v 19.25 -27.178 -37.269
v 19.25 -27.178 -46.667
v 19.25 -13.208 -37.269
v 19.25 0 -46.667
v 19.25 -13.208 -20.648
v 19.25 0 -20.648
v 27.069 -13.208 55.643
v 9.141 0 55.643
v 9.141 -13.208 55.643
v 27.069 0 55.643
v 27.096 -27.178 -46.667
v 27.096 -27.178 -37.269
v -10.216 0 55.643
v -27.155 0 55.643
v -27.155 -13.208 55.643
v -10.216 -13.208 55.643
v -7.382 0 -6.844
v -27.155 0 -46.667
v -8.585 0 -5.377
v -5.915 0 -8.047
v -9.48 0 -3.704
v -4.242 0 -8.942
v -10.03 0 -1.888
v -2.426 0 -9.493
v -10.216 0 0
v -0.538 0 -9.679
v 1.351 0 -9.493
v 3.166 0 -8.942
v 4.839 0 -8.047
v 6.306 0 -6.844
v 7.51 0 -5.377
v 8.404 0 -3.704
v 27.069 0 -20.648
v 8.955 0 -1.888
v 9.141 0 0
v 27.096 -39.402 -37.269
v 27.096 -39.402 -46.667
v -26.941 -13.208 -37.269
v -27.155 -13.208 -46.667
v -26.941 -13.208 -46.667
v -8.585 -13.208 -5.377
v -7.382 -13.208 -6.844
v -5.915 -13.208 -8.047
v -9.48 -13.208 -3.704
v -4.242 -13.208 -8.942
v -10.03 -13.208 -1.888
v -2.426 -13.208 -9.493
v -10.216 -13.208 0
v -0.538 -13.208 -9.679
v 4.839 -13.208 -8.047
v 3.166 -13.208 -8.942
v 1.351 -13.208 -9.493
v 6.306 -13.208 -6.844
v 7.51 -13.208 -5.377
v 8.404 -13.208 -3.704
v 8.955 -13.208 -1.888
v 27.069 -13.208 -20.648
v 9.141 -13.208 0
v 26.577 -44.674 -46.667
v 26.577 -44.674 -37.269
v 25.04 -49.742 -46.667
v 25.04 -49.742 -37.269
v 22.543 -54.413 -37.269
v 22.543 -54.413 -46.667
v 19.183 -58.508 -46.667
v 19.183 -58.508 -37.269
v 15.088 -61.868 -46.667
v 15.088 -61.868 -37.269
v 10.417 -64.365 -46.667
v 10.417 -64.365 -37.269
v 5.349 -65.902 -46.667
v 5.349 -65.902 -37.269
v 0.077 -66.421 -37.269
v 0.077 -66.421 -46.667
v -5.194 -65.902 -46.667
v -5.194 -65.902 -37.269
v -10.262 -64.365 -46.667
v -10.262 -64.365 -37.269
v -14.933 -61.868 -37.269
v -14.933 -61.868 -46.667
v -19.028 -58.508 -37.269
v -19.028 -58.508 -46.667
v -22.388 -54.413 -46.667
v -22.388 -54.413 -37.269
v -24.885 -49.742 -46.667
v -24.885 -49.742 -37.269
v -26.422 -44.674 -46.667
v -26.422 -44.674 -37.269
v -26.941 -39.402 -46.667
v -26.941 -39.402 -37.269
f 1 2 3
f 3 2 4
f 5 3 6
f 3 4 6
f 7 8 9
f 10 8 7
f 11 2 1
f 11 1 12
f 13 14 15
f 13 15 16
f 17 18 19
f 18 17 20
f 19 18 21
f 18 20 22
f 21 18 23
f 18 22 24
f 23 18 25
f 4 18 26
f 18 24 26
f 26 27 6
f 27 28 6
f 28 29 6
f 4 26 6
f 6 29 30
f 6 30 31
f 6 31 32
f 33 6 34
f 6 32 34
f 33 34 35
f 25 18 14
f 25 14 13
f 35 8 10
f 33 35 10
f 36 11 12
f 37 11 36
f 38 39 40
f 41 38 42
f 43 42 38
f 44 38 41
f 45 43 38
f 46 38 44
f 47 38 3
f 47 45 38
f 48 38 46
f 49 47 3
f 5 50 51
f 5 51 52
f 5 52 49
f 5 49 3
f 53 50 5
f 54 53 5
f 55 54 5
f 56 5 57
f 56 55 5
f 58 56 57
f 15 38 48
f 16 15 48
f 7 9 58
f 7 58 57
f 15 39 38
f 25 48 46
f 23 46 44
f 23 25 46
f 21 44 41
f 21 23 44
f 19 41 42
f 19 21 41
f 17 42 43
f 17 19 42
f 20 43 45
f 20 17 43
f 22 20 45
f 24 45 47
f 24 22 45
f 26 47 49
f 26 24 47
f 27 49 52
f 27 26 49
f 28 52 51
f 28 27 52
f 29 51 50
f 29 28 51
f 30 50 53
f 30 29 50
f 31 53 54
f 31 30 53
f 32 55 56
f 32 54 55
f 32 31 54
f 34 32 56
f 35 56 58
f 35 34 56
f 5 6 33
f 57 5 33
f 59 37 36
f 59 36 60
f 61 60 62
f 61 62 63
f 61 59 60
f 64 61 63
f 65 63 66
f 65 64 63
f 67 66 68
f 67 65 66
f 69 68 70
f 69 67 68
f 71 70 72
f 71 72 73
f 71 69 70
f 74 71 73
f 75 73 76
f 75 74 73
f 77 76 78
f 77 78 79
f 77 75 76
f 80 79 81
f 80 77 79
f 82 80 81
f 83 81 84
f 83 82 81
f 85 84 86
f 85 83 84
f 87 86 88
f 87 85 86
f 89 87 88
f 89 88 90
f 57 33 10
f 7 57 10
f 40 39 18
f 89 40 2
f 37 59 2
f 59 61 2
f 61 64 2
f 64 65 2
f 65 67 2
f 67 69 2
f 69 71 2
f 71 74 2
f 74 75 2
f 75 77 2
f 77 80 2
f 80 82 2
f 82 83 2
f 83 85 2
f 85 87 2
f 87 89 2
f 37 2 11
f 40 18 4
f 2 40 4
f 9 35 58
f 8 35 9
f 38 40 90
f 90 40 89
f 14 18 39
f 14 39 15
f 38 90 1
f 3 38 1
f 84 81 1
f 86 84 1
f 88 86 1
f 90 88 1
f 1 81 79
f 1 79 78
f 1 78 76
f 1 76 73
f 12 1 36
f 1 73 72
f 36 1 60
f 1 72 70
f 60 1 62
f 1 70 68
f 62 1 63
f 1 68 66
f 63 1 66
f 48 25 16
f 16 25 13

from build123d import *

# Parameters (mm, degrees)
F0_W     = 54.2243942618
F0_H     = 102.3101732135
F1_DEPTH = 13.208
F2_W     = 19.3572593853
F2_H     = 55.7058900595
F3_DEPTH = 42.164
F6_W     = 54.037803784
F6_H     = 39.4023768604
F7_DEPTH = 9.398
F4_W     = 15.2707248926
F4_H     = 29.6811275184
F8_DEPTH = 27.178


with BuildPart() as f1:
    # F0 (on Front) → F1 (new body)
    with BuildSketch(Plane.XZ):
        with Locations((-0.0431220978, 4.4882334769)):
            Rectangle(F0_W, F0_H)
    extrude(amount=F1_DEPTH)

    # F2 (on Front) → F3 (cut)
    with BuildSketch(Plane.XZ):
        with Locations((-0.5377004854, 27.8529450297)):
            Rectangle(F2_W, F2_H)
        with BuildLine():
            Line((9.1409292072, 0), (-10.2163301781, 0))
            ThreePointArc((-10.2163301781, 0), (-0.5377004854, -9.6786296926), (9.1409292072, 0))
        make_face()
    extrude(amount=F3_DEPTH, mode=Mode.SUBTRACT)

    # F6 (on offset) → F7 (join)
    with BuildSketch(Plane(origin=(0, 0, -46.6668531299), x_dir=(1, 0, 0), z_dir=(0, 0, -1))):
        with Locations((0.077442266, 19.7011884302)):
            Rectangle(F6_W, F6_H)
        with BuildLine():
            ThreePointArc((27.0963441581, 39.4023768604), (0.077442266, 66.4212787524), (-26.941459626, 39.4023768604))
            Line((-26.941459626, 39.4023768604), (27.0963441581, 39.4023768604))
        make_face()
    extrude(amount=-F7_DEPTH)

    # F4 (on Front) → F8 (cut)
    with BuildSketch(Plane.XZ):
        with Locations((26.8850810826, -35.4883056134)):
            Rectangle(F4_W, F4_H)
    extrude(amount=F8_DEPTH, mode=Mode.SUBTRACT)


solid = f1.part
